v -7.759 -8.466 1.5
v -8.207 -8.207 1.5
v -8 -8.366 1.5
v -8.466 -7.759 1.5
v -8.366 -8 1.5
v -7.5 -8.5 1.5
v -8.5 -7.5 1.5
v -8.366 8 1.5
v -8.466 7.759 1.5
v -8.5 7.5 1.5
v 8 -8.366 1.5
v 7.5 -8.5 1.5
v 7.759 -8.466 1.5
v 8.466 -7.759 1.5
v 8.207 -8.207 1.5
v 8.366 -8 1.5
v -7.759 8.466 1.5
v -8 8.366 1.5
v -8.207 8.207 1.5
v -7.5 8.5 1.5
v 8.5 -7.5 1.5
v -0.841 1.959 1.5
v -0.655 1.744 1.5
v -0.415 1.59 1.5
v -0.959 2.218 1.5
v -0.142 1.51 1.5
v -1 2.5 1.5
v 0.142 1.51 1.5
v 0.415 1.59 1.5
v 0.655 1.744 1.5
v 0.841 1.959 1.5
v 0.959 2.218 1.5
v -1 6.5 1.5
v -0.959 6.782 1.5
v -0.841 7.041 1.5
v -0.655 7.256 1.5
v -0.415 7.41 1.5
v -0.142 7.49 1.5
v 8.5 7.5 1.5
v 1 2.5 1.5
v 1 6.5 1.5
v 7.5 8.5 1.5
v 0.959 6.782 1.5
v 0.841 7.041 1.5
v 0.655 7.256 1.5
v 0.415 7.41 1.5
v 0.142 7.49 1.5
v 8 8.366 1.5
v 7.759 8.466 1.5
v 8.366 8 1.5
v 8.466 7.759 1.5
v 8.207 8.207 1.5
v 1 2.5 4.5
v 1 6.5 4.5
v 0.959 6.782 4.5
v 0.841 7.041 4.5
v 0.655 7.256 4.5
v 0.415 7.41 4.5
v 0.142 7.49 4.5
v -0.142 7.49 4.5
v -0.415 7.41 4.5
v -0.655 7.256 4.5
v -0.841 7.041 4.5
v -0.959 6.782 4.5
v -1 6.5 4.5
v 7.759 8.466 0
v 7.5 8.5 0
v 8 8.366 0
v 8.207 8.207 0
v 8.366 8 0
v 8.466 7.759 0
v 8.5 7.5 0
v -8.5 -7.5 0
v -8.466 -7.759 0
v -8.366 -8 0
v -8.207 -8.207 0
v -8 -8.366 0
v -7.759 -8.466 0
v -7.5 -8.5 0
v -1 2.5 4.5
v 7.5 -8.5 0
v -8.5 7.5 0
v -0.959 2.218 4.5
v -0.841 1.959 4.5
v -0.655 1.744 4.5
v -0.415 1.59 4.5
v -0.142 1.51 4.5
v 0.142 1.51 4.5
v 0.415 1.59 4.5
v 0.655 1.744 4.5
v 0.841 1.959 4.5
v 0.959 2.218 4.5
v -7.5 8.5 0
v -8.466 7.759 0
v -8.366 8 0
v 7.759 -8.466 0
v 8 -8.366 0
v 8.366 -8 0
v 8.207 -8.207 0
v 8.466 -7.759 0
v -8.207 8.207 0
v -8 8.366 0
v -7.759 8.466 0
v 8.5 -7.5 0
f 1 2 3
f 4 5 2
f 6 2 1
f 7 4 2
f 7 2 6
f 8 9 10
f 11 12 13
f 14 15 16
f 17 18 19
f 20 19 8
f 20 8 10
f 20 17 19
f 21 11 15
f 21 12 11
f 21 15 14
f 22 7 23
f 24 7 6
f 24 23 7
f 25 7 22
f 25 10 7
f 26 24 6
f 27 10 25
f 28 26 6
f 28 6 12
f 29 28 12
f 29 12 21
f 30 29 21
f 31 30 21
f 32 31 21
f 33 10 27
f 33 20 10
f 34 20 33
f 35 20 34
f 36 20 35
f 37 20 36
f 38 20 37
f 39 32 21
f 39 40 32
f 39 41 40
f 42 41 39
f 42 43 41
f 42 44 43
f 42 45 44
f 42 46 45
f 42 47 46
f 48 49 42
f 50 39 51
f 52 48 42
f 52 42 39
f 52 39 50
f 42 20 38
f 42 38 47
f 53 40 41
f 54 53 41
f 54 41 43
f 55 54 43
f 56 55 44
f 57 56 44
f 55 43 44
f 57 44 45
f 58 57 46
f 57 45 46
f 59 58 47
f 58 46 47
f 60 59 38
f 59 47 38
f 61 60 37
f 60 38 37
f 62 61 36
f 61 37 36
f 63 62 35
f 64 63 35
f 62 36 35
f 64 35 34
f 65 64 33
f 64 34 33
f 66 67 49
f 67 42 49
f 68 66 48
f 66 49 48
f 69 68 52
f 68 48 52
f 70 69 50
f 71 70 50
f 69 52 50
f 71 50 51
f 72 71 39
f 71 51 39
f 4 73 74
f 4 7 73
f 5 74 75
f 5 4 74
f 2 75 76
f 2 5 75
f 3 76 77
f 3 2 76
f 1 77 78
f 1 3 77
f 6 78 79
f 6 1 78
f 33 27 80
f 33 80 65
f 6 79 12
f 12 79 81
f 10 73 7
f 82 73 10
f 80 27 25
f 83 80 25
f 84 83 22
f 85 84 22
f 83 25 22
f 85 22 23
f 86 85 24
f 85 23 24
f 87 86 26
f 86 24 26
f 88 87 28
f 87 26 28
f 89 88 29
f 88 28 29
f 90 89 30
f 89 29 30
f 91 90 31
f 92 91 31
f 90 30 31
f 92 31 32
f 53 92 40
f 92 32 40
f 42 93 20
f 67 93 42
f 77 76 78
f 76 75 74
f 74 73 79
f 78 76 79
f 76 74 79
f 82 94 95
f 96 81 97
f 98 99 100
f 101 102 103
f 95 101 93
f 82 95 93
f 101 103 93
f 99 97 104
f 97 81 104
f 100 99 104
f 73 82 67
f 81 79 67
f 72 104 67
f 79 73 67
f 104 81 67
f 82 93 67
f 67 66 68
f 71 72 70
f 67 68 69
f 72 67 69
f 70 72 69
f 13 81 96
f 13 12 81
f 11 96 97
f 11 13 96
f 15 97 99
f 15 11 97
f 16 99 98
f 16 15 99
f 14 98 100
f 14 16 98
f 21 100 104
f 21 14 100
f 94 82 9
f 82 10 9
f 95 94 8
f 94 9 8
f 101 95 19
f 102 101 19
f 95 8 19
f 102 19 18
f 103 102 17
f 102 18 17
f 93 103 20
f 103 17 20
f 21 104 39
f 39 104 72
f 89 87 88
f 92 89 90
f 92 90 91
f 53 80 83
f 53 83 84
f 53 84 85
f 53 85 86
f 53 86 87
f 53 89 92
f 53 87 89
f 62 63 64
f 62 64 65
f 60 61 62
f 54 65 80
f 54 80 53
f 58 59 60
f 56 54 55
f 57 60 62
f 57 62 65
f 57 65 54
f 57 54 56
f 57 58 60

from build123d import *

# Parameters (mm, degrees)
F0_W     = 17
F0_H     = 17
F1_DEPTH = 1.5
F2_W     = 2
F2_H     = 4
F3_DEPTH = 3
F4_R     = 1


with BuildPart() as f1:
    # F0 (on Top) → F1 (new body)
    with BuildSketch(Plane.XY):
        Rectangle(F0_W, F0_H)
    extrude(amount=F1_DEPTH)

    # F2 (on face) → F3 (join)
    with BuildSketch(Plane.XY.offset(1.5)):
        with BuildLine():
            ThreePointArc((-1, 2.5), (0, 1.5), (1, 2.5))
            Line((1, 2.5), (-1, 2.5))
        make_face()
        with Locations((0, 4.5)):
            Rectangle(F2_W, F2_H)
        with BuildLine():
            Line((-1, 6.5), (1, 6.5))
            ThreePointArc((1, 6.5), (0, 7.5), (-1, 6.5))
        make_face()
    extrude(amount=F3_DEPTH)

    # F4
    f4_edges = [f1.edges().sort_by_distance(p)[0] for p in [
        (-8.5, 8.5, 0.75),
        (-8.5, -8.5, 0.75),
        (8.5, 8.5, 0.75),
        (8.5, -8.5, 0.75),
    ]]
    fillet(f4_edges, radius=F4_R)


solid = f1.part
